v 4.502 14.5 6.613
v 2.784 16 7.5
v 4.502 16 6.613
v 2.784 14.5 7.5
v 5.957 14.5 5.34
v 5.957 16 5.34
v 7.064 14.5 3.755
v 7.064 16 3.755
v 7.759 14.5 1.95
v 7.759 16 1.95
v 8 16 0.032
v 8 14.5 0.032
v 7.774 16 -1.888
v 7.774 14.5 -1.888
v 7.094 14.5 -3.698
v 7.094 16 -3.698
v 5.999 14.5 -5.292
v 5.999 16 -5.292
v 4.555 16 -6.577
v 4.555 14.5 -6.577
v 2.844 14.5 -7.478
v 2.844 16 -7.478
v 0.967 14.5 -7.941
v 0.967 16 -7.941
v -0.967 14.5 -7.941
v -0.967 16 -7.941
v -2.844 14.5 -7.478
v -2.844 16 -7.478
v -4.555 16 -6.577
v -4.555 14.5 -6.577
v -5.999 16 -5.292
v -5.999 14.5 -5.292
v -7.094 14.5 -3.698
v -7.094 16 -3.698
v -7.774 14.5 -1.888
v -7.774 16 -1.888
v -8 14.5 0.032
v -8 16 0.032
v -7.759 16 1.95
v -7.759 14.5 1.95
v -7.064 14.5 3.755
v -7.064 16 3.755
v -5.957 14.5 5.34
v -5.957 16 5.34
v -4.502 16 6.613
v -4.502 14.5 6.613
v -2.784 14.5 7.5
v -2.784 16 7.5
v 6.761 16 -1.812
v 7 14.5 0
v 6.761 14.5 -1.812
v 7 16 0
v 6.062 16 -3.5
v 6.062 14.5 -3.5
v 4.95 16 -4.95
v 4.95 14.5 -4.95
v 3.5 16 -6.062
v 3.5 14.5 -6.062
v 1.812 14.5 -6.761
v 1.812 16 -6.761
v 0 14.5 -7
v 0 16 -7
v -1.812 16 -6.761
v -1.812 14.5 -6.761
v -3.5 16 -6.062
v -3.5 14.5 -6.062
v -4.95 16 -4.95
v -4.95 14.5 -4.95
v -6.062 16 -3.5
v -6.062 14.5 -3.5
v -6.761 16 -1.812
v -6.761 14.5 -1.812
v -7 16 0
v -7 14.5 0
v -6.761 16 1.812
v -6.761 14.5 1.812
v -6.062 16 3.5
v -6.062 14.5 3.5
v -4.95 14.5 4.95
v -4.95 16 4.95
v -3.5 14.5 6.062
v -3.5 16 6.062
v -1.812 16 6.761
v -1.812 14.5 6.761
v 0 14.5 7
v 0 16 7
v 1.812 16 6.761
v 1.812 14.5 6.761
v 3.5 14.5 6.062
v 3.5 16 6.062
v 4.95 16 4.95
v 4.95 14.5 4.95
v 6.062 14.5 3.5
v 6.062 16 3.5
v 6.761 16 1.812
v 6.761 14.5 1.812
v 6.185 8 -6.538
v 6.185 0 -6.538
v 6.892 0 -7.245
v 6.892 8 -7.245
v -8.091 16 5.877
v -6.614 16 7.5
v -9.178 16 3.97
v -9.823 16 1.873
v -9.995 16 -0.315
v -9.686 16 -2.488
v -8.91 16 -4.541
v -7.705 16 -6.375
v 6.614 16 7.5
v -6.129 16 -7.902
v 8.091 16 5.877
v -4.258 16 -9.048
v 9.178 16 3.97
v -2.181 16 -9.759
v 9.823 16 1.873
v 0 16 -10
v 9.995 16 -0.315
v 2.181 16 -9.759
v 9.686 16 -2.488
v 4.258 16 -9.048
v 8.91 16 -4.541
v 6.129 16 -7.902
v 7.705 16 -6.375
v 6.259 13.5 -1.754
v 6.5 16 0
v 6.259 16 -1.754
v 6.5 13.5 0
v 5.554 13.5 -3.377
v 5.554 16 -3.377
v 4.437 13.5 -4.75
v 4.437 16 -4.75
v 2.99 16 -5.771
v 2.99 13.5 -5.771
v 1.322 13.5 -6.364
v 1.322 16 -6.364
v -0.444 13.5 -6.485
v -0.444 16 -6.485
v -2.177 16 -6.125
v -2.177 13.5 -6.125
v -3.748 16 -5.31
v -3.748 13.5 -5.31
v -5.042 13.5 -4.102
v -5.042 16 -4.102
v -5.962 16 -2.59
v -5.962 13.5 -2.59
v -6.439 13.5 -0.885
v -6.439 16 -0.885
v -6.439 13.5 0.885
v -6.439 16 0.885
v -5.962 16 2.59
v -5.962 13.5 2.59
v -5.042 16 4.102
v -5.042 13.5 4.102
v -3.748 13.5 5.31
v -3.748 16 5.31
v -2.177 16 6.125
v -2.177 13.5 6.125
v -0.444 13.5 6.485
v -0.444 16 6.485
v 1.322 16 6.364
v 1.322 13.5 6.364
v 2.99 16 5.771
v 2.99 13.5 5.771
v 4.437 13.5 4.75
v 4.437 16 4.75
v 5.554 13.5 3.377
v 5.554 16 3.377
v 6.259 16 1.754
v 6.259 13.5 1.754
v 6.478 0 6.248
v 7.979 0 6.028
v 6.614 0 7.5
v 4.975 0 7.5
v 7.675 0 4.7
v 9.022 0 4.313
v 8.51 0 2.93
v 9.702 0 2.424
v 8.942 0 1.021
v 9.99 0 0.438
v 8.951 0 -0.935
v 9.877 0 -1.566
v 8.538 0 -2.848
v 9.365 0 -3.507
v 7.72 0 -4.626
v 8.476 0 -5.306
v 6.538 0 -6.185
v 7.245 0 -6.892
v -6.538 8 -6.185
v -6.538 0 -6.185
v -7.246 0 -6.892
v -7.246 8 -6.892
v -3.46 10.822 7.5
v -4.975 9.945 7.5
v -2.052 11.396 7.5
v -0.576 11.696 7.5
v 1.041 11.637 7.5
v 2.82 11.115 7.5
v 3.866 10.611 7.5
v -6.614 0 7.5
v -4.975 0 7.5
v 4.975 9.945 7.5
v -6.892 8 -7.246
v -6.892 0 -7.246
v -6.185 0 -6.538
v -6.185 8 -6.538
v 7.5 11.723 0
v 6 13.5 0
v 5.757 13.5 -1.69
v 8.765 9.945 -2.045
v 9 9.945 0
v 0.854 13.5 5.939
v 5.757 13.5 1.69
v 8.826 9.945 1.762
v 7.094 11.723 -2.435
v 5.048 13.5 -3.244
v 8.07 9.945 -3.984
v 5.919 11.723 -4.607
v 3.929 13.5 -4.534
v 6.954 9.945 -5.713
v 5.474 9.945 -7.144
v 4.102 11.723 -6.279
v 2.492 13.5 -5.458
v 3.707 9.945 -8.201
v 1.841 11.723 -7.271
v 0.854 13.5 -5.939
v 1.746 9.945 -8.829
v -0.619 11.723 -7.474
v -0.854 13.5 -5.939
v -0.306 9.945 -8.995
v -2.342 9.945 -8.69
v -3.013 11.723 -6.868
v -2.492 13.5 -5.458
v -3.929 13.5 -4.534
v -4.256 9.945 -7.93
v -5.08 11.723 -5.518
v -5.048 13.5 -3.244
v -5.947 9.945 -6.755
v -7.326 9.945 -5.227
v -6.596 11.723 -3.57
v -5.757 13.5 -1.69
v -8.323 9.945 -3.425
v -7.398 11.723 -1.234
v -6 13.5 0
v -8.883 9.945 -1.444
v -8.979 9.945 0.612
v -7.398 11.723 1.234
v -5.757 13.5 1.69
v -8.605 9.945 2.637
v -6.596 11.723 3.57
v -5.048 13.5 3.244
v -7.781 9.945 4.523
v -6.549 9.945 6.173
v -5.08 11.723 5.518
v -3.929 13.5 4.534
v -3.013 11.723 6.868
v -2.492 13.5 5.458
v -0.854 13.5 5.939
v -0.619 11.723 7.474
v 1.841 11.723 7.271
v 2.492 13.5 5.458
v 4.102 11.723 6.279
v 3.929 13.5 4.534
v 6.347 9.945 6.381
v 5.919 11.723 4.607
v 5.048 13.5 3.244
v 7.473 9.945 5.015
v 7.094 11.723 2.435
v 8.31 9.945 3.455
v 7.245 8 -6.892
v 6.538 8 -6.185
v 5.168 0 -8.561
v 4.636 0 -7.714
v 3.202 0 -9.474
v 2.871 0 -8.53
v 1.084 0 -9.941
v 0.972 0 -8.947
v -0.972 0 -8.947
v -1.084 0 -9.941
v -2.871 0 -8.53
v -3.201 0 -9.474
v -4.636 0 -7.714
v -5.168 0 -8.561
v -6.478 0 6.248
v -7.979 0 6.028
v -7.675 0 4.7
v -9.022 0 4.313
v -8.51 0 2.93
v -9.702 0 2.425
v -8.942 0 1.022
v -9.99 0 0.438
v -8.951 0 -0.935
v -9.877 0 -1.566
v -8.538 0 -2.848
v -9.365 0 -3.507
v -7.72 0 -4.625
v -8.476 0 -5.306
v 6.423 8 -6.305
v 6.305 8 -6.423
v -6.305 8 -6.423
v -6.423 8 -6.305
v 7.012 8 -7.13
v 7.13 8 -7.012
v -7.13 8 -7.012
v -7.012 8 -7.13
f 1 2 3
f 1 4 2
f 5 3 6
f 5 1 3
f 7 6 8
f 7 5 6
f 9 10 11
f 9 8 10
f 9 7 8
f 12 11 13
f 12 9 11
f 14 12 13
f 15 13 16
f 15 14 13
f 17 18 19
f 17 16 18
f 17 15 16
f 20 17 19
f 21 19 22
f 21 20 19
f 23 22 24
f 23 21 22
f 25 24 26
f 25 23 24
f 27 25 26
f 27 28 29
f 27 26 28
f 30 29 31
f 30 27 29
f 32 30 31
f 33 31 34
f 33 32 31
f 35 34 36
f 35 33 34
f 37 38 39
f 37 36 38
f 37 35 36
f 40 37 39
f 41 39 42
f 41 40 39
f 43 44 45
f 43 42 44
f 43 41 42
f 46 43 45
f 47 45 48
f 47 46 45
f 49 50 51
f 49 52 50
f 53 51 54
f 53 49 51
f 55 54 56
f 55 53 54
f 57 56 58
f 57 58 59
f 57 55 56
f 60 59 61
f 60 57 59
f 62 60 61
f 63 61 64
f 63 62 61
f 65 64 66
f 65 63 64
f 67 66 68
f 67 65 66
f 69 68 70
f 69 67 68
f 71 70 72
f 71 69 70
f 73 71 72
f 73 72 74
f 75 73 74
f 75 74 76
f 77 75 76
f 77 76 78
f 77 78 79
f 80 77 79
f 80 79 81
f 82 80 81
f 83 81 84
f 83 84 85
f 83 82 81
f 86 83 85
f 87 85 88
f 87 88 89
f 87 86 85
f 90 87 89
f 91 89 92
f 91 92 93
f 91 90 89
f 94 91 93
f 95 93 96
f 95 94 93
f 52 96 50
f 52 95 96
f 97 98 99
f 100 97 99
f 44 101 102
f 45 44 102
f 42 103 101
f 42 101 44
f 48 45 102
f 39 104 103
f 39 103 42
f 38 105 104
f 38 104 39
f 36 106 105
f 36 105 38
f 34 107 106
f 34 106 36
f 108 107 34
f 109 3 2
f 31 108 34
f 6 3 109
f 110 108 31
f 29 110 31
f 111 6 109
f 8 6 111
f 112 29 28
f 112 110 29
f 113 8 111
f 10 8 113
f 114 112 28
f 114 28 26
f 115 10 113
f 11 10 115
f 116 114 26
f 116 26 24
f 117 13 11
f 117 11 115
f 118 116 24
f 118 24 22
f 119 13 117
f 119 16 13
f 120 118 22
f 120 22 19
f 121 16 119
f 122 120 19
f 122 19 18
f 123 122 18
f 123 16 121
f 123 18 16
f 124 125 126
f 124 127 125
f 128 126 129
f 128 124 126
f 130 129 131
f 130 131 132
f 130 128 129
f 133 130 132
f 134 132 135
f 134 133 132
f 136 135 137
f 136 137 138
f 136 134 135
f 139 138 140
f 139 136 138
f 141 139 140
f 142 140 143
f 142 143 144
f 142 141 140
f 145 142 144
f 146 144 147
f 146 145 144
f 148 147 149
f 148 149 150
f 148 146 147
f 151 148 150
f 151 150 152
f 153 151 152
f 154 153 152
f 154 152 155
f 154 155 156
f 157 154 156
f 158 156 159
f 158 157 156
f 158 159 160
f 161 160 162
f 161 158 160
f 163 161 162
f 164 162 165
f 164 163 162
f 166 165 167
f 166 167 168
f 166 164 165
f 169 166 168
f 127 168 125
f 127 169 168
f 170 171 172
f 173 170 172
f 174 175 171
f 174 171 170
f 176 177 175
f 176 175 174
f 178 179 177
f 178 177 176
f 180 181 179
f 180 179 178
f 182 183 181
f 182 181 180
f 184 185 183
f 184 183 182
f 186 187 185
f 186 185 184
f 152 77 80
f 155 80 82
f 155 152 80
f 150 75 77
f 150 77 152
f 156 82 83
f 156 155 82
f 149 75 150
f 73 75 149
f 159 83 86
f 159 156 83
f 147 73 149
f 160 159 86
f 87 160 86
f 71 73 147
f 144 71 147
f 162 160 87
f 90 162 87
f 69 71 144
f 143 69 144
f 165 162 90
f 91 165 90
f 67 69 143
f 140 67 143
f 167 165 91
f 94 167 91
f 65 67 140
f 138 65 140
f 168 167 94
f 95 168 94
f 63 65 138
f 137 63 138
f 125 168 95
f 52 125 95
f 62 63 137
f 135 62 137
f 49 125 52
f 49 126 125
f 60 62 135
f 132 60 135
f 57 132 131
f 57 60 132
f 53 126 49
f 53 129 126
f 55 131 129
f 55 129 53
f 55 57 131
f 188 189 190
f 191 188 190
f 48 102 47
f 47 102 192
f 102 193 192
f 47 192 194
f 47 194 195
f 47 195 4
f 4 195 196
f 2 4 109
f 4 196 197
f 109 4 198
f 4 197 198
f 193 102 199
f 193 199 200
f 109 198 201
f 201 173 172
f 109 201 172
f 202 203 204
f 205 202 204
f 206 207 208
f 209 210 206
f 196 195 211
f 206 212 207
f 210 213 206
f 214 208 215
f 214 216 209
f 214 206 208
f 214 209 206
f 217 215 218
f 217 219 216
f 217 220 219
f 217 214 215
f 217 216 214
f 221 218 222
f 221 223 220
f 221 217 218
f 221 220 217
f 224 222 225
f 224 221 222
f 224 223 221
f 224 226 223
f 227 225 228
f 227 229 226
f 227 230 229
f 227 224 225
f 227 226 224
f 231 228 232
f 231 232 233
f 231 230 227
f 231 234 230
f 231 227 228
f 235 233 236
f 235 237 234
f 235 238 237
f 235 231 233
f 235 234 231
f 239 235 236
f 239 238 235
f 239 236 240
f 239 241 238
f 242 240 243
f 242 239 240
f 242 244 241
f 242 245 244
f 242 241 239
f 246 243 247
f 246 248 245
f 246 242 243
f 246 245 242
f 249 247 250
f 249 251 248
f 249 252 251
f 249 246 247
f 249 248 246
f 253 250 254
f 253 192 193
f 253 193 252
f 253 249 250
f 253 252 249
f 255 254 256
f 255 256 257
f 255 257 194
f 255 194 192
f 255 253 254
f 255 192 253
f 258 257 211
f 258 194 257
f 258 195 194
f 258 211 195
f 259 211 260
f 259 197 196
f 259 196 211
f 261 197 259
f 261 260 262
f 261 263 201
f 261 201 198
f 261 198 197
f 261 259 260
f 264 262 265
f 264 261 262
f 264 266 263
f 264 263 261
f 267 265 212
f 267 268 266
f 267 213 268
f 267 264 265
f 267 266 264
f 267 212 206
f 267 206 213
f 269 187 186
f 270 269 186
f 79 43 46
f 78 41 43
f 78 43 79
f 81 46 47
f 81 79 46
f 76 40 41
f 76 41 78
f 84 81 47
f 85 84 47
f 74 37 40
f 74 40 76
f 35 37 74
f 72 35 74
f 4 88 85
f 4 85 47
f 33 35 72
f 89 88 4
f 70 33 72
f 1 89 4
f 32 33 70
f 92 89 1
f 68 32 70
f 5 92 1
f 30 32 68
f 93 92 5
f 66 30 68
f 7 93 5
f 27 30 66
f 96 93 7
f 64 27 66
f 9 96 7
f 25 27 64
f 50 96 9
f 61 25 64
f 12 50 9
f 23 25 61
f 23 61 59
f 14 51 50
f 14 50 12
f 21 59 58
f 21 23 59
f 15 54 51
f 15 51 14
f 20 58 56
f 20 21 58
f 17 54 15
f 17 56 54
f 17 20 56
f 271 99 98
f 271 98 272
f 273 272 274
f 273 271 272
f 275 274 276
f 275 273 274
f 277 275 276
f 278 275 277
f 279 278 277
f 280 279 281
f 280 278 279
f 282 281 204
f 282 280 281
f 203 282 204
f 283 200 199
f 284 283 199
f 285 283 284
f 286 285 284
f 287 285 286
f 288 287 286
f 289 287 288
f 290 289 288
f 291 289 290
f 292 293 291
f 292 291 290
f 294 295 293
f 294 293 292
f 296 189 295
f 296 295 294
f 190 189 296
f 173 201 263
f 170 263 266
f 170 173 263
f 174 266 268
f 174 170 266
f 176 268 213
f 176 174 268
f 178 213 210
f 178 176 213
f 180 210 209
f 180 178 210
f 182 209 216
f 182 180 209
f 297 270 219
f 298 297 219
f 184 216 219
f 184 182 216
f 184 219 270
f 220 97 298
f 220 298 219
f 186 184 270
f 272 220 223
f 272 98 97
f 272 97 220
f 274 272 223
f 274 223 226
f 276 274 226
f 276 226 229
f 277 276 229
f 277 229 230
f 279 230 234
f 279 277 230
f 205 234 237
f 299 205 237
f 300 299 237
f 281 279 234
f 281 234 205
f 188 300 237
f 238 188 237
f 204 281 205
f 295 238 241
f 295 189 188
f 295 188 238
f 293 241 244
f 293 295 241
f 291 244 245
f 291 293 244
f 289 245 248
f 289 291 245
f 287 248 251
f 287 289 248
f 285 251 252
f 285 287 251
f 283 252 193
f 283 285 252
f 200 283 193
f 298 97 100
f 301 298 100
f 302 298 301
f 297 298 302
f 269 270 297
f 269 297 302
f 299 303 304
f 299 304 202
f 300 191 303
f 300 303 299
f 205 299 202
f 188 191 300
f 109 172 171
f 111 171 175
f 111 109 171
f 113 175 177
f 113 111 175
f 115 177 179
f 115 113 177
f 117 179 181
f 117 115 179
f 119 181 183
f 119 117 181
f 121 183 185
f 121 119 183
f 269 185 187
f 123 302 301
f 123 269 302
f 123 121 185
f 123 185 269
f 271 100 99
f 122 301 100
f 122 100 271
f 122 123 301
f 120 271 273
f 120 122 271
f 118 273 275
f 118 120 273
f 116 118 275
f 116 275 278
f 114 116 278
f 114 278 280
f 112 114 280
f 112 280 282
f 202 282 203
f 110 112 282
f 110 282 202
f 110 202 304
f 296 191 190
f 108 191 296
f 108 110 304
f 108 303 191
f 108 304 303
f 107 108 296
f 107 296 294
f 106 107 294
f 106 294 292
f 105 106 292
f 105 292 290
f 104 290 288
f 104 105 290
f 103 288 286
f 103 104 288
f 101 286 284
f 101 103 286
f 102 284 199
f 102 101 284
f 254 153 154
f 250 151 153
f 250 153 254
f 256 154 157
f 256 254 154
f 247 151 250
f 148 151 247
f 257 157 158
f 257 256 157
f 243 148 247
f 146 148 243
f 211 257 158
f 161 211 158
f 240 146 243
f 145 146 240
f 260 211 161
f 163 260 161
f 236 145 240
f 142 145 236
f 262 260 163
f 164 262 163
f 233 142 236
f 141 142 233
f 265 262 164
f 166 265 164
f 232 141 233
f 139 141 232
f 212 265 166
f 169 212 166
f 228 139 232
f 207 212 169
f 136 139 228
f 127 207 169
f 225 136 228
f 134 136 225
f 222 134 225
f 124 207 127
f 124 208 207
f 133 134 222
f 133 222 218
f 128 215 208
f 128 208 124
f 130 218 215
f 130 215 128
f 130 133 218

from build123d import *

# Parameters (mm, degrees)
F3_DEPTH = 8
F5_DEPTH = 16.001


with BuildPart() as f1:
    # F0 (on Top) → F1 (revolve)
    with BuildSketch(Plane.XY):
        Polygon((9, 0), (10, 0), (10, 16), (8, 16), (8, 14.5), (7, 14.5), (7, 16), (6.5, 16), (6.5, 13.5), (6, 13.5), (9, 9.9451635033), align=None)
    revolve(axis=Axis((0, 8.0098584294, 0), (0, 1, 0)))

    # F2 (on face) → F3 (cut)
    with BuildSketch(Plane.XZ):
        with BuildLine():
            Line((-6.8920810625, -7.2456344531), (-6.1847286297, -6.5382820203))
            ThreePointArc((-6.1847286297, -6.5382820203), (-6.3639610307, -6.3639610307), (-6.5382820203, -6.1847286297))
            Line((-6.5382820203, -6.1847286297), (-7.2456344531, -6.8920810625))
            ThreePointArc((-7.2456344531, -6.8920810625), (-7.0710678119, -7.0710678119), (-6.8920810625, -7.2456344531))
        make_face()
        with BuildLine():
            Line((7.2454194103, -6.8923071296), (6.5380675904, -6.1849553097))
            ThreePointArc((6.5380675904, -6.1849553097), (6.3639610307, -6.3639610307), (6.1849553097, -6.5380675904))
            Line((6.1849553097, -6.5380675904), (6.8923071296, -7.2454194103))
            ThreePointArc((6.8923071296, -7.2454194103), (7.0710678119, -7.0710678119), (7.2454194103, -6.8923071296))
        make_face()
    extrude(amount=-F3_DEPTH, mode=Mode.SUBTRACT)

    # F4 (on face) → F5 (cut, through all)
    with BuildSketch(Plane.XZ):
        with BuildLine():
            Line((-4.9749371855, 7.5), (0, 7.5))
            Line((0, 7.5), (4.9749371855, 7.5))
            ThreePointArc((4.9749371855, 7.5), (0, 9), (-4.9749371855, 7.5))
        make_face()
        with BuildLine():
            ThreePointArc((-4.9749371855, 7.5), (0, 9), (4.9749371855, 7.5))
            Line((4.9749371855, 7.5), (6.6143782777, 7.5))
            ThreePointArc((6.6143782777, 7.5), (0, 10), (-6.6143782777, 7.5))
            Line((-6.6143782777, 7.5), (-4.9749371855, 7.5))
        make_face()
    extrude(amount=-F5_DEPTH, mode=Mode.SUBTRACT)


solid = f1.part
